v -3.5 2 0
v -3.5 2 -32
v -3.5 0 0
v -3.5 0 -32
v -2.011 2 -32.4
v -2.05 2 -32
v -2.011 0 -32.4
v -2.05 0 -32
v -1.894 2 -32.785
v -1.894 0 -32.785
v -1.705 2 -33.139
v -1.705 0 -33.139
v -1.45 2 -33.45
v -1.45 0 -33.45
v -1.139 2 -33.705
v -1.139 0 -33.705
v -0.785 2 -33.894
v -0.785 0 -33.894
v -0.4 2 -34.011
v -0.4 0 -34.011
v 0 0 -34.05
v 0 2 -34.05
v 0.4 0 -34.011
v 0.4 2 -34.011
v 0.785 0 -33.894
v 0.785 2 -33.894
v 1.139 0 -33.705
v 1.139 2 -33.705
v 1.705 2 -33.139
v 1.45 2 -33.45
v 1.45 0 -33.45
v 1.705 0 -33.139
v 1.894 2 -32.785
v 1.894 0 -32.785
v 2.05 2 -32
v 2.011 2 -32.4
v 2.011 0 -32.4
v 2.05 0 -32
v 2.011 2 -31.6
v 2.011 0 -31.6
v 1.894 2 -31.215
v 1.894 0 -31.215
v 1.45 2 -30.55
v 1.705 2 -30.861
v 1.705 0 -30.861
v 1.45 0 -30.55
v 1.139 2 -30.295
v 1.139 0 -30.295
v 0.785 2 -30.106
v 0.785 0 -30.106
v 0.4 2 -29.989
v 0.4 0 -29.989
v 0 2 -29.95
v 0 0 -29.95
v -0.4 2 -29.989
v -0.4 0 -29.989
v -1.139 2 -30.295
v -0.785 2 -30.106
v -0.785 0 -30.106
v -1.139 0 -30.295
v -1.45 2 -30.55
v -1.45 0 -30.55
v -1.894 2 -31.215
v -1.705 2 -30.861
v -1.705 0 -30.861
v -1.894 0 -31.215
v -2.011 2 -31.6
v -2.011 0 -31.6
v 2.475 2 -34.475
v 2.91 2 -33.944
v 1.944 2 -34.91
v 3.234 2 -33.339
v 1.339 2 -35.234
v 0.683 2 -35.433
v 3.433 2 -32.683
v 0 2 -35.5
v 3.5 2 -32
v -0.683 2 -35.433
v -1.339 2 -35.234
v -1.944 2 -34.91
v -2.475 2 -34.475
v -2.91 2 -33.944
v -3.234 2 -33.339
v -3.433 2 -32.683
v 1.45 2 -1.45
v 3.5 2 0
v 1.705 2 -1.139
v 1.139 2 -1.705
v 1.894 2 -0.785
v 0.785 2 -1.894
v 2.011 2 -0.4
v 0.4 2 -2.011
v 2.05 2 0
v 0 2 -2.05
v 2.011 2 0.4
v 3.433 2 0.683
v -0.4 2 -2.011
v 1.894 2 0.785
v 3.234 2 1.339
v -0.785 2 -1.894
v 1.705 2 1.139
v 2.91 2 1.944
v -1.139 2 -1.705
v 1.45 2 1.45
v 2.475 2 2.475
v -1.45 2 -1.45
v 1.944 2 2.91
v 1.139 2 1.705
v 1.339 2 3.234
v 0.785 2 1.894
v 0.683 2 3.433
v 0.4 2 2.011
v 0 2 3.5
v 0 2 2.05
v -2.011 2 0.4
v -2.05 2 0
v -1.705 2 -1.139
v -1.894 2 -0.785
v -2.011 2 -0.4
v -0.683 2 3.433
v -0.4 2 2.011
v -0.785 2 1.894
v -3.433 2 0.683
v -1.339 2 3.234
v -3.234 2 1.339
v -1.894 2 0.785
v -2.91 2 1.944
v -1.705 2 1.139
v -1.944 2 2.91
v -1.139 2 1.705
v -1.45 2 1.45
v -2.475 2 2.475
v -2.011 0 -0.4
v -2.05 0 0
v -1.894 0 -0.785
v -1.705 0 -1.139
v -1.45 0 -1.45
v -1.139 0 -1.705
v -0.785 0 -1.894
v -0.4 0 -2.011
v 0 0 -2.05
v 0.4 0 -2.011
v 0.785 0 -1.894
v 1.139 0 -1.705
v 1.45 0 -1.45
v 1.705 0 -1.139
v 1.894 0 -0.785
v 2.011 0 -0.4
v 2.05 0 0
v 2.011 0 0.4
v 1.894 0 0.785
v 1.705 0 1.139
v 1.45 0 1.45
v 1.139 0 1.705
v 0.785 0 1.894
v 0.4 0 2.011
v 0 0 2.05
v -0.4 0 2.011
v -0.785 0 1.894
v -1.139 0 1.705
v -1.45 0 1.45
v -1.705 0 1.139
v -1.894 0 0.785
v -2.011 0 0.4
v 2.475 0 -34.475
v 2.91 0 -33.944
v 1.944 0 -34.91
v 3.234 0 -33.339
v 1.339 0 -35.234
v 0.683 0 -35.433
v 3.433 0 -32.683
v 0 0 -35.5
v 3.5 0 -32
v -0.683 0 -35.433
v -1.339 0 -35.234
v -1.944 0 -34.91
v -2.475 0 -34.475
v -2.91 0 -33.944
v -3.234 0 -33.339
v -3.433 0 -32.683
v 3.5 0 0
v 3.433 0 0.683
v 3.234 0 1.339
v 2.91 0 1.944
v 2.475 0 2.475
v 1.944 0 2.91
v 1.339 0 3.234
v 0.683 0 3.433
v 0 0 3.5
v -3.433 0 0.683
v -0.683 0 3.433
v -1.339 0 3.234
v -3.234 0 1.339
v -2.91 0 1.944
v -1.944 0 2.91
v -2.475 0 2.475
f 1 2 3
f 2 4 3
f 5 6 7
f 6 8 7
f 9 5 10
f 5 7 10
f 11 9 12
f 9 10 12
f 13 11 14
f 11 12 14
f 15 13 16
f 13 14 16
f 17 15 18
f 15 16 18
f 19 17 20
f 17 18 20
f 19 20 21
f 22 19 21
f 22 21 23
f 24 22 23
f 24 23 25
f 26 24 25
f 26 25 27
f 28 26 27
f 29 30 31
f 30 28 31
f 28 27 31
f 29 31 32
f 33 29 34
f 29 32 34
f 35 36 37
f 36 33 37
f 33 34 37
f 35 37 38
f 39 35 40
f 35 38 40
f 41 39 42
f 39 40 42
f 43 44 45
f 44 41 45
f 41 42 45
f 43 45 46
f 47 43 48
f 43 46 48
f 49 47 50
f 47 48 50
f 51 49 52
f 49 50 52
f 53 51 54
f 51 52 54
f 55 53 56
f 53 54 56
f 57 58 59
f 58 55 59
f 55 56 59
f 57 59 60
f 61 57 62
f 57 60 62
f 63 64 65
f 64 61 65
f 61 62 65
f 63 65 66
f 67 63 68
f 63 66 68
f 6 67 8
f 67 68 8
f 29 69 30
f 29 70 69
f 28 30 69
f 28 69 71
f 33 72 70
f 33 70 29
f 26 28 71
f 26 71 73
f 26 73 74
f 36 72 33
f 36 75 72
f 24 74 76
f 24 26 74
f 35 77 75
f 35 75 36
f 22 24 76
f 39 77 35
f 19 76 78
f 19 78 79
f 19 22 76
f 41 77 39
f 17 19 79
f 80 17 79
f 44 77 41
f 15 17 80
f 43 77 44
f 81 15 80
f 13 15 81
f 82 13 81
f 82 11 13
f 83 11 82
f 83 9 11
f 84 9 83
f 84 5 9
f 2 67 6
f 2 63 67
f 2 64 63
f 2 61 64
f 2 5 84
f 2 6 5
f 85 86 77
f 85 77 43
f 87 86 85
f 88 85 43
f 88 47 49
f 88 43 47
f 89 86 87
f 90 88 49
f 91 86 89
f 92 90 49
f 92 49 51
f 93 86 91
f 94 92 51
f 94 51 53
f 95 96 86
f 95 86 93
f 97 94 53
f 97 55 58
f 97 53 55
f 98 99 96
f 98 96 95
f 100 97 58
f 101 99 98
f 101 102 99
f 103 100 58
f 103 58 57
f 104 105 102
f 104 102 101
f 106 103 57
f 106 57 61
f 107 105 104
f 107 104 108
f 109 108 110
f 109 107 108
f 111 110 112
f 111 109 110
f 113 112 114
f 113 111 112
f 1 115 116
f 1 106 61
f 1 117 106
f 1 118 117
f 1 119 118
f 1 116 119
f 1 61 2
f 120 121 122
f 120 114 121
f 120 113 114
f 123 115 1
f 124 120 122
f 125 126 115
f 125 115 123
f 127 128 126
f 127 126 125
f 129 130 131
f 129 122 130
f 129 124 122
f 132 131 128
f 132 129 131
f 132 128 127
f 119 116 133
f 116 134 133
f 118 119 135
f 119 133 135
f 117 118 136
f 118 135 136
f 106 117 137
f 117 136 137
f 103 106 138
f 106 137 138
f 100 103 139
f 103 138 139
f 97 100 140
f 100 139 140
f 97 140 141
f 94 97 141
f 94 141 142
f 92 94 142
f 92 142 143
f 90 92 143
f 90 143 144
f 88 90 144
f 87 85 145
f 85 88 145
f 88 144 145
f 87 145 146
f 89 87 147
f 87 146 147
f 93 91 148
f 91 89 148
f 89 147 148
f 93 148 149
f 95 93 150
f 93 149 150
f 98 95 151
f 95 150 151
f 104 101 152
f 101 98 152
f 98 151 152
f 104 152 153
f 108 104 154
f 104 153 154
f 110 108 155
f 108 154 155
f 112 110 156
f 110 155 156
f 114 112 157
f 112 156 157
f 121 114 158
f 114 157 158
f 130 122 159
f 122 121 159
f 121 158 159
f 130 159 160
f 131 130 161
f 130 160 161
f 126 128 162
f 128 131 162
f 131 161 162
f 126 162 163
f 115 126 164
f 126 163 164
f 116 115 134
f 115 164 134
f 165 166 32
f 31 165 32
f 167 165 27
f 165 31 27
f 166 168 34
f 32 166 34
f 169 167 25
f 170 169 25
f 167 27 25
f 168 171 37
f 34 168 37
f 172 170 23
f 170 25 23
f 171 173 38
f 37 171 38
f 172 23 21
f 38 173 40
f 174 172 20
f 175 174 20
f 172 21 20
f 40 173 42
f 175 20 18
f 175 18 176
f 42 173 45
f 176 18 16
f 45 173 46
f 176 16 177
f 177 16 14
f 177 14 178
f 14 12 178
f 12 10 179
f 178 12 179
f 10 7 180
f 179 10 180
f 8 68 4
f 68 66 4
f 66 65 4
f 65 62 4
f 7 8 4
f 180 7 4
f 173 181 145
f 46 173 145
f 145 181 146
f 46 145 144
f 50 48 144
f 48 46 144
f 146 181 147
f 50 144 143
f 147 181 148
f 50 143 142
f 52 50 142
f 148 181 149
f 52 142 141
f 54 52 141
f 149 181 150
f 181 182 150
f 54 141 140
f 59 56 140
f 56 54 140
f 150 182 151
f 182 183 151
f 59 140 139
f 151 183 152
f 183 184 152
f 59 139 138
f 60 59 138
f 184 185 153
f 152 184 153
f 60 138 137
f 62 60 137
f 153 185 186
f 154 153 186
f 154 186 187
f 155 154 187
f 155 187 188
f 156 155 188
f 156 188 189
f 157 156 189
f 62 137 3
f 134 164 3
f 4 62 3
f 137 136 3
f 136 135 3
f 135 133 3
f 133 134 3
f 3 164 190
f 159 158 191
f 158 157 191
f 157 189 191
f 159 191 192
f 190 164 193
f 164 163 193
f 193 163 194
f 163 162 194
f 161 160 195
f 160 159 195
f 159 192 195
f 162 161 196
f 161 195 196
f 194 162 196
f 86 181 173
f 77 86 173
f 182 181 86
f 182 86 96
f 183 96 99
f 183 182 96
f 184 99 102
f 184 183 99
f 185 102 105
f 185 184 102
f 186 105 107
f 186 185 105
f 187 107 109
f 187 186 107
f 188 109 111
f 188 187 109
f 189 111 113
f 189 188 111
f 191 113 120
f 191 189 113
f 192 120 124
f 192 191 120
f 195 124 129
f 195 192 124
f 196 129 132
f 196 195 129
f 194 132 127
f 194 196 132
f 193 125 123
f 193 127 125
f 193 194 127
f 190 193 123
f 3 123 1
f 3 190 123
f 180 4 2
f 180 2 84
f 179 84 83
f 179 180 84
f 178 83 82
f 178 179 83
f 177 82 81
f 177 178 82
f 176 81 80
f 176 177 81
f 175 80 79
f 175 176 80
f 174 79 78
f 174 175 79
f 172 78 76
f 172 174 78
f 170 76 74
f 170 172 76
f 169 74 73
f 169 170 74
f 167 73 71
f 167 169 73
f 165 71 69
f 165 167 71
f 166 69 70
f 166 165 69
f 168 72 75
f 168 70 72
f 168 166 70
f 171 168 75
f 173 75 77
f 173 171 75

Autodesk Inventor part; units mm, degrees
ref_plane "YZ Plane" through (0, 0, 0) normal (1, 0, 0) x (0, 1, 0)
ref_plane "XZ Plane" through (0, 0, 0) normal (0, 1, 0) x (-1, 0, 0)
ref_plane "XY Plane" through (0, 0, 0) normal (0, 0, 1) x (1, 0, 0)
sketch "Sketch1" plane through (0, 0, 0) normal (0, 1, 0) x (-1, 0, 0)
  circle A0 centre (0, 0) radius 2.05
  circle A1 centre (0, -32) radius 2.05
  line L0 (0, 0) -> (0, -32) construction
  line L1 (-3.5, 0) -> (-3.5, -32)
  line L2 (3.5, -32) -> (3.5, 0)
  arc A2 (3.5, 0) -> (-3.5, 0) centre (0, 0) ccw
  arc A3 (-3.5, -32) -> (3.5, -32) centre (0, -32) ccw
  point P0 (0, -16)
  dimension "d1" = 4.1
  dimension "d2" = 4.1
  dimension "d3" = 7
extrude "Extrusion1" add sketch "Sketch1" along normal blind 2
properties part number "Micro_servo_frame_1"
